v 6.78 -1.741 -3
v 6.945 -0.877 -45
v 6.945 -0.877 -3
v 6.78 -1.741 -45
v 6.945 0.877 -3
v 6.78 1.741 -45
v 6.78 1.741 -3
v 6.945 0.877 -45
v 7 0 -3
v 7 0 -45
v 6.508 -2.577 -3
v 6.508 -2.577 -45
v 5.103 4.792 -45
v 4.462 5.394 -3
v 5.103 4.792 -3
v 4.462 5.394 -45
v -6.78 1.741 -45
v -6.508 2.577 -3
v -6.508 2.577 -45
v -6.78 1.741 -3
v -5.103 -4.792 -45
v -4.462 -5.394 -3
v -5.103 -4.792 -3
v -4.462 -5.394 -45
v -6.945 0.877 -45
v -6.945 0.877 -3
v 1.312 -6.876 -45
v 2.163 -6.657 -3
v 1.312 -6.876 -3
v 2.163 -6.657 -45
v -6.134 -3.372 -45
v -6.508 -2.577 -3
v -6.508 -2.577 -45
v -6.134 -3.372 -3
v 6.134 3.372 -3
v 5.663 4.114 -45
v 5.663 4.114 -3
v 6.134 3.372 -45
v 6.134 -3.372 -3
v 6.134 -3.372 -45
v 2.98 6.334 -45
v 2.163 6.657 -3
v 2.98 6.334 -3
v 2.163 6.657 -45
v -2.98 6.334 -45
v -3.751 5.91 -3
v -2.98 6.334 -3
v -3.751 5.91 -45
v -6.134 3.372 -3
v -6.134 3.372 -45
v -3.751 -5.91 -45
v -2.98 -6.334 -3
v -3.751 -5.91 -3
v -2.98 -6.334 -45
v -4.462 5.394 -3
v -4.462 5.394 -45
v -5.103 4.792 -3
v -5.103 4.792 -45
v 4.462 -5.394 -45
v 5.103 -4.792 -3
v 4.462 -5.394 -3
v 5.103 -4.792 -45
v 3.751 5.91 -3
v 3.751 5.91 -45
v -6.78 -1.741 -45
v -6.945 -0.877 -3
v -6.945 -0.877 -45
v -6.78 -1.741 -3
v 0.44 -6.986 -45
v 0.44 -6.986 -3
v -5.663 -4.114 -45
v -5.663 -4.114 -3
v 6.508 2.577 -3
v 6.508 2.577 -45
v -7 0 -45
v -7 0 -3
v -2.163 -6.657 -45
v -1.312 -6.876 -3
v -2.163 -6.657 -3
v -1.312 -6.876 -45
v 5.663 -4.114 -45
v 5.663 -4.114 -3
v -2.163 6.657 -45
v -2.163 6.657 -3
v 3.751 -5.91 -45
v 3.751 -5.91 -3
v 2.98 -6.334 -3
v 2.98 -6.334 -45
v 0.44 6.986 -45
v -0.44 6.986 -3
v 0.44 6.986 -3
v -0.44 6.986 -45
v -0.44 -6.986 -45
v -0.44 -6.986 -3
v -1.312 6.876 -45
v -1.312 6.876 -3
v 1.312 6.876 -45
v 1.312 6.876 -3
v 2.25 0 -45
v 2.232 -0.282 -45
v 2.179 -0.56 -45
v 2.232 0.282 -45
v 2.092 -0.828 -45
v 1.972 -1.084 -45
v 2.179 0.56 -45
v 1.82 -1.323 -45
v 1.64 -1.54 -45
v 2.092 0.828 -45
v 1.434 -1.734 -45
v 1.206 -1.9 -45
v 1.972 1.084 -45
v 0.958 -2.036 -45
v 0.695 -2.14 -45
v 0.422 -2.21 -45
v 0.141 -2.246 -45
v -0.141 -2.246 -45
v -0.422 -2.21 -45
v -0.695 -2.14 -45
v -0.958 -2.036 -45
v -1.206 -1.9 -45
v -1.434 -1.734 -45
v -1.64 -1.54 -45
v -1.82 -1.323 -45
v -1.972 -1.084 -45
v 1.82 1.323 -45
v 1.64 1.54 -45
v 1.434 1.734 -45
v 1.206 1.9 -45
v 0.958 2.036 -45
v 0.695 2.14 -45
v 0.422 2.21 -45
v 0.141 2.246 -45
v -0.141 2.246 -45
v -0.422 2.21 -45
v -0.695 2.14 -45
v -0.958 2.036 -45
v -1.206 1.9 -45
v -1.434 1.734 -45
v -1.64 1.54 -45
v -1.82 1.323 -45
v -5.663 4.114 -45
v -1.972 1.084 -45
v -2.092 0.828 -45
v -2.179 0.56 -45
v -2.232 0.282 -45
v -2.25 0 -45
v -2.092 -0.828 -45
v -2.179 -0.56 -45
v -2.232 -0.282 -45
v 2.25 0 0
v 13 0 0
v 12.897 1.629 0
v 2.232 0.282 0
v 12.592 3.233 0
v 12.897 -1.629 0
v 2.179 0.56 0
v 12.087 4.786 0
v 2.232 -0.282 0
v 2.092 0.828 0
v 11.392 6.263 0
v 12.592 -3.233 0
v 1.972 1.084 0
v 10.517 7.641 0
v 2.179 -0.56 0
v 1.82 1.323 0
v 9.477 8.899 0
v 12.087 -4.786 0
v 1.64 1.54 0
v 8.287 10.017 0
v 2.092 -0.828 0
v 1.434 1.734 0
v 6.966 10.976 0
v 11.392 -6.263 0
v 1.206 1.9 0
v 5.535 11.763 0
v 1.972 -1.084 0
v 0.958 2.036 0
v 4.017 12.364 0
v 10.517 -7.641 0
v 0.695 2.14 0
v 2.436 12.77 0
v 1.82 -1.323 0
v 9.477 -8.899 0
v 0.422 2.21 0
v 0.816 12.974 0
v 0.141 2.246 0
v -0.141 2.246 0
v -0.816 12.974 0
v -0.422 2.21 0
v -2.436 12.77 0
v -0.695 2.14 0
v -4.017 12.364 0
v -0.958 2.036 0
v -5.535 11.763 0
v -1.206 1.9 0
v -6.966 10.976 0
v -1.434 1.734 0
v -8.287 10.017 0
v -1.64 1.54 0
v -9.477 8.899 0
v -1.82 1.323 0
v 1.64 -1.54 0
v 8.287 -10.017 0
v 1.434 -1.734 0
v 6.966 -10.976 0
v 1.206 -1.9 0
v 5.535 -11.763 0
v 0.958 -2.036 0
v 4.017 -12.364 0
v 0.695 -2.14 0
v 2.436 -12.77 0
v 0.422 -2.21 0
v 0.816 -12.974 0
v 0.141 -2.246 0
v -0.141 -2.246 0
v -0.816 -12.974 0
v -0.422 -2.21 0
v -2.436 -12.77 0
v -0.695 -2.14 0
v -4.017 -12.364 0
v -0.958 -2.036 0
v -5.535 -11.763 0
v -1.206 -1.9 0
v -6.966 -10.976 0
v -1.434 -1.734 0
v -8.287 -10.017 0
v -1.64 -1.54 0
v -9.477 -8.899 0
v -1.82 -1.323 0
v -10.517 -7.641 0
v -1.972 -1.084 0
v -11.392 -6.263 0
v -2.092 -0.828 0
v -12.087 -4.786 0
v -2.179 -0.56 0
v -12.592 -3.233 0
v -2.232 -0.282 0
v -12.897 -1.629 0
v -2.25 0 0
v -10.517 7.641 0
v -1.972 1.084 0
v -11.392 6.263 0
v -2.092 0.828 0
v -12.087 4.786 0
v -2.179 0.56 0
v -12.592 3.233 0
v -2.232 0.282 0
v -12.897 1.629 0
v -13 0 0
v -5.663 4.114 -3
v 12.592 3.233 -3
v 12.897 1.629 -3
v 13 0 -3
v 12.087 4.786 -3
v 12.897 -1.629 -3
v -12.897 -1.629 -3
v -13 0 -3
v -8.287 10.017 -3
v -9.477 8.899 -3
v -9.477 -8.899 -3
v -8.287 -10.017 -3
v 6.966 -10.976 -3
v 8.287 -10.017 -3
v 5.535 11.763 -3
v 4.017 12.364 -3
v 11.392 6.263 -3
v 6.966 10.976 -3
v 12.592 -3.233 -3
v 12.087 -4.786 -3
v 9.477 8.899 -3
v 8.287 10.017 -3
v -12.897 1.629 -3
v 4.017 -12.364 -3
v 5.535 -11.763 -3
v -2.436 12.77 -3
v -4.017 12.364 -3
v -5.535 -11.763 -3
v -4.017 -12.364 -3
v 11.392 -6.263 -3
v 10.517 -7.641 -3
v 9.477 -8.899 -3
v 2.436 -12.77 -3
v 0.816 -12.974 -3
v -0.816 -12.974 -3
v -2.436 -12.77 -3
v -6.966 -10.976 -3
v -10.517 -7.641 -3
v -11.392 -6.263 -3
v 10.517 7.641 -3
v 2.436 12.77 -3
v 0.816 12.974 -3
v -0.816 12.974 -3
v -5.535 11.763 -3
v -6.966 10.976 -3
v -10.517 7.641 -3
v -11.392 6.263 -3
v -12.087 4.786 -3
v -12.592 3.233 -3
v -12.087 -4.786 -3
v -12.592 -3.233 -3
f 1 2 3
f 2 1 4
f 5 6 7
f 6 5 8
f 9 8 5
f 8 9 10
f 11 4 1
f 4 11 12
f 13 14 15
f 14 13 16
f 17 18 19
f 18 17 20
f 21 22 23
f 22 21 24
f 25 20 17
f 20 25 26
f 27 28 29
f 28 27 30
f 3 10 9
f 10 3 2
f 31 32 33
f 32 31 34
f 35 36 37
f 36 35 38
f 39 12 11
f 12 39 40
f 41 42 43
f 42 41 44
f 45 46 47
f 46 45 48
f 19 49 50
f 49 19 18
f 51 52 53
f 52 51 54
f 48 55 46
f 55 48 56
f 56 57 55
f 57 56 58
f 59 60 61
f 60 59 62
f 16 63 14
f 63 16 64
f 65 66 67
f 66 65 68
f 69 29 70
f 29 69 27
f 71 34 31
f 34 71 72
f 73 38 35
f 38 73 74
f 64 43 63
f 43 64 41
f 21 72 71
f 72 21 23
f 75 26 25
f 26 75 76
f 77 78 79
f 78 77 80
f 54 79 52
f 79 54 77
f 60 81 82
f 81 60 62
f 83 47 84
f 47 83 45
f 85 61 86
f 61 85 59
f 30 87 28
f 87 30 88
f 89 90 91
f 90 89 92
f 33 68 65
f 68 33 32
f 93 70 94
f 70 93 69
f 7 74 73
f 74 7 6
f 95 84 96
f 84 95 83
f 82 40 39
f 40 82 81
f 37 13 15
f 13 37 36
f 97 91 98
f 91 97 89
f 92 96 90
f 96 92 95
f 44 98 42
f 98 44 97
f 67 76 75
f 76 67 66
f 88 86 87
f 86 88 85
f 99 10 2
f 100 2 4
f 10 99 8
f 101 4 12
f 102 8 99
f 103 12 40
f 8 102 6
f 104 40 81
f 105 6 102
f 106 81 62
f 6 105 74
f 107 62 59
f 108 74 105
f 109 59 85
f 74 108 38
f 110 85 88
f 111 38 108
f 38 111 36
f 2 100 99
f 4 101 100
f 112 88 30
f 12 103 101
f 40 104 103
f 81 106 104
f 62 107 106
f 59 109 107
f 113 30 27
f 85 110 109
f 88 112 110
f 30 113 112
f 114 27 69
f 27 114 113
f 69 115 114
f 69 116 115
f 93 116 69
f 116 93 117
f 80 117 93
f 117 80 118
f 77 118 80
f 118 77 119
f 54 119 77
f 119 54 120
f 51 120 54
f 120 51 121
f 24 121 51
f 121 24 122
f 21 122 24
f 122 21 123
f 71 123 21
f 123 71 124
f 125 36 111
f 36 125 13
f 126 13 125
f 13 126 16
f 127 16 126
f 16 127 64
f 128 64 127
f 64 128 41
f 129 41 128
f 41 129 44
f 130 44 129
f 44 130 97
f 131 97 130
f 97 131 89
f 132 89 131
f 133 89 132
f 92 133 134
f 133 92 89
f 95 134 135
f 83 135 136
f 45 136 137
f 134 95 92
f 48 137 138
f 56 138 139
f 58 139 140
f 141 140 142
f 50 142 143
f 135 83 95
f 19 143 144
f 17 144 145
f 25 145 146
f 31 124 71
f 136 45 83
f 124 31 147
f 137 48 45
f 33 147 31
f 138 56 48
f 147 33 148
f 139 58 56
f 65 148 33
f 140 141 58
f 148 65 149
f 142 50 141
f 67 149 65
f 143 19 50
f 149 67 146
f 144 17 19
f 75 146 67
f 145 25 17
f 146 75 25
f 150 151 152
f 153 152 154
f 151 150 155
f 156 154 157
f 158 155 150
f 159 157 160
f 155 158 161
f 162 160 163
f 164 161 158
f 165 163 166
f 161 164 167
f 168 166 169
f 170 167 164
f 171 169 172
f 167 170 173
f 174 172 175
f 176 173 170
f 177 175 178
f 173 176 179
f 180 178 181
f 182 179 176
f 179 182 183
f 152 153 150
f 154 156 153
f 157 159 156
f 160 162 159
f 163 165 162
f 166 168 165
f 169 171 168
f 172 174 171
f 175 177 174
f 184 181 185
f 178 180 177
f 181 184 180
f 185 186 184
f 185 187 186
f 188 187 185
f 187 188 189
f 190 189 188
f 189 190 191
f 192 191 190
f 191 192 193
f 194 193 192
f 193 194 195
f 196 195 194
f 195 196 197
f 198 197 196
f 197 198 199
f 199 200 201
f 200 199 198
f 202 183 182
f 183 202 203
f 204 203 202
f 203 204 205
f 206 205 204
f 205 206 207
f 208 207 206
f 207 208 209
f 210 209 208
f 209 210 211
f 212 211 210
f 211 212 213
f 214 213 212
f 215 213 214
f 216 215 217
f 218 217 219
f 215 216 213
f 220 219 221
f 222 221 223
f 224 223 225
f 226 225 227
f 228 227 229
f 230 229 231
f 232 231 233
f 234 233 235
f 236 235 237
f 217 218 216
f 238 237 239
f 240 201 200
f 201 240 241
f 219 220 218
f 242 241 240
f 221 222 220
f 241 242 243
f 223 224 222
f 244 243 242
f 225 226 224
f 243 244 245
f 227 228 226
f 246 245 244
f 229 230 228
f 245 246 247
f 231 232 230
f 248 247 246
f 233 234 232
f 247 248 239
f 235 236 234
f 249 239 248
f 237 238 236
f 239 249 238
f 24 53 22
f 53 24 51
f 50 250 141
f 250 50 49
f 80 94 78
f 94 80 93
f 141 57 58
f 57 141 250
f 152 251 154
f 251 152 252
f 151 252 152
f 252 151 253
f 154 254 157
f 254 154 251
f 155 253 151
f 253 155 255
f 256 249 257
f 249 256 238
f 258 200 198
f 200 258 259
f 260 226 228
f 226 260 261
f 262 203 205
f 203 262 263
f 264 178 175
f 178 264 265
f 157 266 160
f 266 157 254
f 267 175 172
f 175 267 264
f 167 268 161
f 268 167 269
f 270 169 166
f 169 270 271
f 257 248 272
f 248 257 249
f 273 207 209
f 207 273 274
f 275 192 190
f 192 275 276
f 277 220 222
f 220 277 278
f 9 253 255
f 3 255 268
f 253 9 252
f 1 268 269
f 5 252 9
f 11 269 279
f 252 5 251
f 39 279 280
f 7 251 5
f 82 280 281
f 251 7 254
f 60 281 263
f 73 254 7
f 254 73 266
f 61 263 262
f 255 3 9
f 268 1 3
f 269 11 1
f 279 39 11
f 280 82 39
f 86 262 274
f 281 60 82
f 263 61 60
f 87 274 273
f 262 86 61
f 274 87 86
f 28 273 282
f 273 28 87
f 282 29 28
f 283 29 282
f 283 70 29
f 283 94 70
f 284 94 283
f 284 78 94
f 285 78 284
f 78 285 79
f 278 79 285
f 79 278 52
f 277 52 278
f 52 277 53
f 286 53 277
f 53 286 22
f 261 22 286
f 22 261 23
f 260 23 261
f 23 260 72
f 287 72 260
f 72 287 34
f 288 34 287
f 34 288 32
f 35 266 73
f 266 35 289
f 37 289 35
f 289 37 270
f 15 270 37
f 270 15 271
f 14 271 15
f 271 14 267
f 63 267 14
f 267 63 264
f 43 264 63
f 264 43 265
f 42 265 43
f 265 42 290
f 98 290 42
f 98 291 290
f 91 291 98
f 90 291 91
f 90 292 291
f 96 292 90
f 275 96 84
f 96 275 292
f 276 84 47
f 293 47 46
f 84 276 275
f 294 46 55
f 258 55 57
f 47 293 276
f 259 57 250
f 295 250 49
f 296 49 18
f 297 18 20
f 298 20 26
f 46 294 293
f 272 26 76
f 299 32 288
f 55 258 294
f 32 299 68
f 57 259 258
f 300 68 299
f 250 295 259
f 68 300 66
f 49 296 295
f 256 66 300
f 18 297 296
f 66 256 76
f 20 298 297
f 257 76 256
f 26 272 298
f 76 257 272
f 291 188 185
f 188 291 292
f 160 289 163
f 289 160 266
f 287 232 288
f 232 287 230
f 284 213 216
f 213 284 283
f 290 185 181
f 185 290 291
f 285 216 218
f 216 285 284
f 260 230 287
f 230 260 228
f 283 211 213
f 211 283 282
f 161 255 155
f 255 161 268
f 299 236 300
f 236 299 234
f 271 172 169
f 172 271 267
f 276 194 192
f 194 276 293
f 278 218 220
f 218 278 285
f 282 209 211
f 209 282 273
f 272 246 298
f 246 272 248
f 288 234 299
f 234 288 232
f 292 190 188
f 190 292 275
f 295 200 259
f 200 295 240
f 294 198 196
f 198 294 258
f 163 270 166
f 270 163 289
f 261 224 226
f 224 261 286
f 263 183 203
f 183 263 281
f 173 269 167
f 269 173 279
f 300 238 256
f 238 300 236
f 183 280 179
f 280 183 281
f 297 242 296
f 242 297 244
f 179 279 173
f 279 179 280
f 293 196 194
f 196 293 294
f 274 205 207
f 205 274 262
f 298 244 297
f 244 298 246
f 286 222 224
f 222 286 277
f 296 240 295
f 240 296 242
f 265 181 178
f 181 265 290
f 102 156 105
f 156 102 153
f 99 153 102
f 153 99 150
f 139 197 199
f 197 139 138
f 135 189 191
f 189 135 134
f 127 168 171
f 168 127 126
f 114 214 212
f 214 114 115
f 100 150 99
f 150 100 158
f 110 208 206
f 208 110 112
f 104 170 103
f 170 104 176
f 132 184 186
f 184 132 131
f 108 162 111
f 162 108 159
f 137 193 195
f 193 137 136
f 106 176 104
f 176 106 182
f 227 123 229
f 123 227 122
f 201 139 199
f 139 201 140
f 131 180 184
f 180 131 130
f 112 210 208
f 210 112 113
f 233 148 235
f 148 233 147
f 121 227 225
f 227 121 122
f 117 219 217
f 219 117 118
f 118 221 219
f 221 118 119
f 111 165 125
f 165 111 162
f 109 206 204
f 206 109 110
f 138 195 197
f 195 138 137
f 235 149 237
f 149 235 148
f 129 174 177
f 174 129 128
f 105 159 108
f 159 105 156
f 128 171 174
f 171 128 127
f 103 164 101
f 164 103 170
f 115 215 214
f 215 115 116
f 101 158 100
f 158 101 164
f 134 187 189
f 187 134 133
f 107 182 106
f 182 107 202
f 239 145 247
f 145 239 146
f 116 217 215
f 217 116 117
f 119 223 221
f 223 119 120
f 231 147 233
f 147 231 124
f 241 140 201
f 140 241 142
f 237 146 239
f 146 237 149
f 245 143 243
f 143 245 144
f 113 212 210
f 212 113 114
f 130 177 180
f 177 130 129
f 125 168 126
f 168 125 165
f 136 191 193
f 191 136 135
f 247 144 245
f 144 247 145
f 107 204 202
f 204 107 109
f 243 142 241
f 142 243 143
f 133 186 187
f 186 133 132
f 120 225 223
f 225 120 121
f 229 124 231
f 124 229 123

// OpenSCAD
$fn = 50;


difference() {
	union() {
		translate(v = [0, 0, -45.0000000000]) {
			cylinder(h = 45, r = 7.0000000000);
		}
		translate(v = [0, 0, -3.0000000000]) {
			cylinder(h = 3, r = 13.0000000000);
		}
	}
	union() {
		#translate(v = [0, 0, -45]) {
			cylinder(h = 45, r = 2.2500000000);
		}
	}
}
